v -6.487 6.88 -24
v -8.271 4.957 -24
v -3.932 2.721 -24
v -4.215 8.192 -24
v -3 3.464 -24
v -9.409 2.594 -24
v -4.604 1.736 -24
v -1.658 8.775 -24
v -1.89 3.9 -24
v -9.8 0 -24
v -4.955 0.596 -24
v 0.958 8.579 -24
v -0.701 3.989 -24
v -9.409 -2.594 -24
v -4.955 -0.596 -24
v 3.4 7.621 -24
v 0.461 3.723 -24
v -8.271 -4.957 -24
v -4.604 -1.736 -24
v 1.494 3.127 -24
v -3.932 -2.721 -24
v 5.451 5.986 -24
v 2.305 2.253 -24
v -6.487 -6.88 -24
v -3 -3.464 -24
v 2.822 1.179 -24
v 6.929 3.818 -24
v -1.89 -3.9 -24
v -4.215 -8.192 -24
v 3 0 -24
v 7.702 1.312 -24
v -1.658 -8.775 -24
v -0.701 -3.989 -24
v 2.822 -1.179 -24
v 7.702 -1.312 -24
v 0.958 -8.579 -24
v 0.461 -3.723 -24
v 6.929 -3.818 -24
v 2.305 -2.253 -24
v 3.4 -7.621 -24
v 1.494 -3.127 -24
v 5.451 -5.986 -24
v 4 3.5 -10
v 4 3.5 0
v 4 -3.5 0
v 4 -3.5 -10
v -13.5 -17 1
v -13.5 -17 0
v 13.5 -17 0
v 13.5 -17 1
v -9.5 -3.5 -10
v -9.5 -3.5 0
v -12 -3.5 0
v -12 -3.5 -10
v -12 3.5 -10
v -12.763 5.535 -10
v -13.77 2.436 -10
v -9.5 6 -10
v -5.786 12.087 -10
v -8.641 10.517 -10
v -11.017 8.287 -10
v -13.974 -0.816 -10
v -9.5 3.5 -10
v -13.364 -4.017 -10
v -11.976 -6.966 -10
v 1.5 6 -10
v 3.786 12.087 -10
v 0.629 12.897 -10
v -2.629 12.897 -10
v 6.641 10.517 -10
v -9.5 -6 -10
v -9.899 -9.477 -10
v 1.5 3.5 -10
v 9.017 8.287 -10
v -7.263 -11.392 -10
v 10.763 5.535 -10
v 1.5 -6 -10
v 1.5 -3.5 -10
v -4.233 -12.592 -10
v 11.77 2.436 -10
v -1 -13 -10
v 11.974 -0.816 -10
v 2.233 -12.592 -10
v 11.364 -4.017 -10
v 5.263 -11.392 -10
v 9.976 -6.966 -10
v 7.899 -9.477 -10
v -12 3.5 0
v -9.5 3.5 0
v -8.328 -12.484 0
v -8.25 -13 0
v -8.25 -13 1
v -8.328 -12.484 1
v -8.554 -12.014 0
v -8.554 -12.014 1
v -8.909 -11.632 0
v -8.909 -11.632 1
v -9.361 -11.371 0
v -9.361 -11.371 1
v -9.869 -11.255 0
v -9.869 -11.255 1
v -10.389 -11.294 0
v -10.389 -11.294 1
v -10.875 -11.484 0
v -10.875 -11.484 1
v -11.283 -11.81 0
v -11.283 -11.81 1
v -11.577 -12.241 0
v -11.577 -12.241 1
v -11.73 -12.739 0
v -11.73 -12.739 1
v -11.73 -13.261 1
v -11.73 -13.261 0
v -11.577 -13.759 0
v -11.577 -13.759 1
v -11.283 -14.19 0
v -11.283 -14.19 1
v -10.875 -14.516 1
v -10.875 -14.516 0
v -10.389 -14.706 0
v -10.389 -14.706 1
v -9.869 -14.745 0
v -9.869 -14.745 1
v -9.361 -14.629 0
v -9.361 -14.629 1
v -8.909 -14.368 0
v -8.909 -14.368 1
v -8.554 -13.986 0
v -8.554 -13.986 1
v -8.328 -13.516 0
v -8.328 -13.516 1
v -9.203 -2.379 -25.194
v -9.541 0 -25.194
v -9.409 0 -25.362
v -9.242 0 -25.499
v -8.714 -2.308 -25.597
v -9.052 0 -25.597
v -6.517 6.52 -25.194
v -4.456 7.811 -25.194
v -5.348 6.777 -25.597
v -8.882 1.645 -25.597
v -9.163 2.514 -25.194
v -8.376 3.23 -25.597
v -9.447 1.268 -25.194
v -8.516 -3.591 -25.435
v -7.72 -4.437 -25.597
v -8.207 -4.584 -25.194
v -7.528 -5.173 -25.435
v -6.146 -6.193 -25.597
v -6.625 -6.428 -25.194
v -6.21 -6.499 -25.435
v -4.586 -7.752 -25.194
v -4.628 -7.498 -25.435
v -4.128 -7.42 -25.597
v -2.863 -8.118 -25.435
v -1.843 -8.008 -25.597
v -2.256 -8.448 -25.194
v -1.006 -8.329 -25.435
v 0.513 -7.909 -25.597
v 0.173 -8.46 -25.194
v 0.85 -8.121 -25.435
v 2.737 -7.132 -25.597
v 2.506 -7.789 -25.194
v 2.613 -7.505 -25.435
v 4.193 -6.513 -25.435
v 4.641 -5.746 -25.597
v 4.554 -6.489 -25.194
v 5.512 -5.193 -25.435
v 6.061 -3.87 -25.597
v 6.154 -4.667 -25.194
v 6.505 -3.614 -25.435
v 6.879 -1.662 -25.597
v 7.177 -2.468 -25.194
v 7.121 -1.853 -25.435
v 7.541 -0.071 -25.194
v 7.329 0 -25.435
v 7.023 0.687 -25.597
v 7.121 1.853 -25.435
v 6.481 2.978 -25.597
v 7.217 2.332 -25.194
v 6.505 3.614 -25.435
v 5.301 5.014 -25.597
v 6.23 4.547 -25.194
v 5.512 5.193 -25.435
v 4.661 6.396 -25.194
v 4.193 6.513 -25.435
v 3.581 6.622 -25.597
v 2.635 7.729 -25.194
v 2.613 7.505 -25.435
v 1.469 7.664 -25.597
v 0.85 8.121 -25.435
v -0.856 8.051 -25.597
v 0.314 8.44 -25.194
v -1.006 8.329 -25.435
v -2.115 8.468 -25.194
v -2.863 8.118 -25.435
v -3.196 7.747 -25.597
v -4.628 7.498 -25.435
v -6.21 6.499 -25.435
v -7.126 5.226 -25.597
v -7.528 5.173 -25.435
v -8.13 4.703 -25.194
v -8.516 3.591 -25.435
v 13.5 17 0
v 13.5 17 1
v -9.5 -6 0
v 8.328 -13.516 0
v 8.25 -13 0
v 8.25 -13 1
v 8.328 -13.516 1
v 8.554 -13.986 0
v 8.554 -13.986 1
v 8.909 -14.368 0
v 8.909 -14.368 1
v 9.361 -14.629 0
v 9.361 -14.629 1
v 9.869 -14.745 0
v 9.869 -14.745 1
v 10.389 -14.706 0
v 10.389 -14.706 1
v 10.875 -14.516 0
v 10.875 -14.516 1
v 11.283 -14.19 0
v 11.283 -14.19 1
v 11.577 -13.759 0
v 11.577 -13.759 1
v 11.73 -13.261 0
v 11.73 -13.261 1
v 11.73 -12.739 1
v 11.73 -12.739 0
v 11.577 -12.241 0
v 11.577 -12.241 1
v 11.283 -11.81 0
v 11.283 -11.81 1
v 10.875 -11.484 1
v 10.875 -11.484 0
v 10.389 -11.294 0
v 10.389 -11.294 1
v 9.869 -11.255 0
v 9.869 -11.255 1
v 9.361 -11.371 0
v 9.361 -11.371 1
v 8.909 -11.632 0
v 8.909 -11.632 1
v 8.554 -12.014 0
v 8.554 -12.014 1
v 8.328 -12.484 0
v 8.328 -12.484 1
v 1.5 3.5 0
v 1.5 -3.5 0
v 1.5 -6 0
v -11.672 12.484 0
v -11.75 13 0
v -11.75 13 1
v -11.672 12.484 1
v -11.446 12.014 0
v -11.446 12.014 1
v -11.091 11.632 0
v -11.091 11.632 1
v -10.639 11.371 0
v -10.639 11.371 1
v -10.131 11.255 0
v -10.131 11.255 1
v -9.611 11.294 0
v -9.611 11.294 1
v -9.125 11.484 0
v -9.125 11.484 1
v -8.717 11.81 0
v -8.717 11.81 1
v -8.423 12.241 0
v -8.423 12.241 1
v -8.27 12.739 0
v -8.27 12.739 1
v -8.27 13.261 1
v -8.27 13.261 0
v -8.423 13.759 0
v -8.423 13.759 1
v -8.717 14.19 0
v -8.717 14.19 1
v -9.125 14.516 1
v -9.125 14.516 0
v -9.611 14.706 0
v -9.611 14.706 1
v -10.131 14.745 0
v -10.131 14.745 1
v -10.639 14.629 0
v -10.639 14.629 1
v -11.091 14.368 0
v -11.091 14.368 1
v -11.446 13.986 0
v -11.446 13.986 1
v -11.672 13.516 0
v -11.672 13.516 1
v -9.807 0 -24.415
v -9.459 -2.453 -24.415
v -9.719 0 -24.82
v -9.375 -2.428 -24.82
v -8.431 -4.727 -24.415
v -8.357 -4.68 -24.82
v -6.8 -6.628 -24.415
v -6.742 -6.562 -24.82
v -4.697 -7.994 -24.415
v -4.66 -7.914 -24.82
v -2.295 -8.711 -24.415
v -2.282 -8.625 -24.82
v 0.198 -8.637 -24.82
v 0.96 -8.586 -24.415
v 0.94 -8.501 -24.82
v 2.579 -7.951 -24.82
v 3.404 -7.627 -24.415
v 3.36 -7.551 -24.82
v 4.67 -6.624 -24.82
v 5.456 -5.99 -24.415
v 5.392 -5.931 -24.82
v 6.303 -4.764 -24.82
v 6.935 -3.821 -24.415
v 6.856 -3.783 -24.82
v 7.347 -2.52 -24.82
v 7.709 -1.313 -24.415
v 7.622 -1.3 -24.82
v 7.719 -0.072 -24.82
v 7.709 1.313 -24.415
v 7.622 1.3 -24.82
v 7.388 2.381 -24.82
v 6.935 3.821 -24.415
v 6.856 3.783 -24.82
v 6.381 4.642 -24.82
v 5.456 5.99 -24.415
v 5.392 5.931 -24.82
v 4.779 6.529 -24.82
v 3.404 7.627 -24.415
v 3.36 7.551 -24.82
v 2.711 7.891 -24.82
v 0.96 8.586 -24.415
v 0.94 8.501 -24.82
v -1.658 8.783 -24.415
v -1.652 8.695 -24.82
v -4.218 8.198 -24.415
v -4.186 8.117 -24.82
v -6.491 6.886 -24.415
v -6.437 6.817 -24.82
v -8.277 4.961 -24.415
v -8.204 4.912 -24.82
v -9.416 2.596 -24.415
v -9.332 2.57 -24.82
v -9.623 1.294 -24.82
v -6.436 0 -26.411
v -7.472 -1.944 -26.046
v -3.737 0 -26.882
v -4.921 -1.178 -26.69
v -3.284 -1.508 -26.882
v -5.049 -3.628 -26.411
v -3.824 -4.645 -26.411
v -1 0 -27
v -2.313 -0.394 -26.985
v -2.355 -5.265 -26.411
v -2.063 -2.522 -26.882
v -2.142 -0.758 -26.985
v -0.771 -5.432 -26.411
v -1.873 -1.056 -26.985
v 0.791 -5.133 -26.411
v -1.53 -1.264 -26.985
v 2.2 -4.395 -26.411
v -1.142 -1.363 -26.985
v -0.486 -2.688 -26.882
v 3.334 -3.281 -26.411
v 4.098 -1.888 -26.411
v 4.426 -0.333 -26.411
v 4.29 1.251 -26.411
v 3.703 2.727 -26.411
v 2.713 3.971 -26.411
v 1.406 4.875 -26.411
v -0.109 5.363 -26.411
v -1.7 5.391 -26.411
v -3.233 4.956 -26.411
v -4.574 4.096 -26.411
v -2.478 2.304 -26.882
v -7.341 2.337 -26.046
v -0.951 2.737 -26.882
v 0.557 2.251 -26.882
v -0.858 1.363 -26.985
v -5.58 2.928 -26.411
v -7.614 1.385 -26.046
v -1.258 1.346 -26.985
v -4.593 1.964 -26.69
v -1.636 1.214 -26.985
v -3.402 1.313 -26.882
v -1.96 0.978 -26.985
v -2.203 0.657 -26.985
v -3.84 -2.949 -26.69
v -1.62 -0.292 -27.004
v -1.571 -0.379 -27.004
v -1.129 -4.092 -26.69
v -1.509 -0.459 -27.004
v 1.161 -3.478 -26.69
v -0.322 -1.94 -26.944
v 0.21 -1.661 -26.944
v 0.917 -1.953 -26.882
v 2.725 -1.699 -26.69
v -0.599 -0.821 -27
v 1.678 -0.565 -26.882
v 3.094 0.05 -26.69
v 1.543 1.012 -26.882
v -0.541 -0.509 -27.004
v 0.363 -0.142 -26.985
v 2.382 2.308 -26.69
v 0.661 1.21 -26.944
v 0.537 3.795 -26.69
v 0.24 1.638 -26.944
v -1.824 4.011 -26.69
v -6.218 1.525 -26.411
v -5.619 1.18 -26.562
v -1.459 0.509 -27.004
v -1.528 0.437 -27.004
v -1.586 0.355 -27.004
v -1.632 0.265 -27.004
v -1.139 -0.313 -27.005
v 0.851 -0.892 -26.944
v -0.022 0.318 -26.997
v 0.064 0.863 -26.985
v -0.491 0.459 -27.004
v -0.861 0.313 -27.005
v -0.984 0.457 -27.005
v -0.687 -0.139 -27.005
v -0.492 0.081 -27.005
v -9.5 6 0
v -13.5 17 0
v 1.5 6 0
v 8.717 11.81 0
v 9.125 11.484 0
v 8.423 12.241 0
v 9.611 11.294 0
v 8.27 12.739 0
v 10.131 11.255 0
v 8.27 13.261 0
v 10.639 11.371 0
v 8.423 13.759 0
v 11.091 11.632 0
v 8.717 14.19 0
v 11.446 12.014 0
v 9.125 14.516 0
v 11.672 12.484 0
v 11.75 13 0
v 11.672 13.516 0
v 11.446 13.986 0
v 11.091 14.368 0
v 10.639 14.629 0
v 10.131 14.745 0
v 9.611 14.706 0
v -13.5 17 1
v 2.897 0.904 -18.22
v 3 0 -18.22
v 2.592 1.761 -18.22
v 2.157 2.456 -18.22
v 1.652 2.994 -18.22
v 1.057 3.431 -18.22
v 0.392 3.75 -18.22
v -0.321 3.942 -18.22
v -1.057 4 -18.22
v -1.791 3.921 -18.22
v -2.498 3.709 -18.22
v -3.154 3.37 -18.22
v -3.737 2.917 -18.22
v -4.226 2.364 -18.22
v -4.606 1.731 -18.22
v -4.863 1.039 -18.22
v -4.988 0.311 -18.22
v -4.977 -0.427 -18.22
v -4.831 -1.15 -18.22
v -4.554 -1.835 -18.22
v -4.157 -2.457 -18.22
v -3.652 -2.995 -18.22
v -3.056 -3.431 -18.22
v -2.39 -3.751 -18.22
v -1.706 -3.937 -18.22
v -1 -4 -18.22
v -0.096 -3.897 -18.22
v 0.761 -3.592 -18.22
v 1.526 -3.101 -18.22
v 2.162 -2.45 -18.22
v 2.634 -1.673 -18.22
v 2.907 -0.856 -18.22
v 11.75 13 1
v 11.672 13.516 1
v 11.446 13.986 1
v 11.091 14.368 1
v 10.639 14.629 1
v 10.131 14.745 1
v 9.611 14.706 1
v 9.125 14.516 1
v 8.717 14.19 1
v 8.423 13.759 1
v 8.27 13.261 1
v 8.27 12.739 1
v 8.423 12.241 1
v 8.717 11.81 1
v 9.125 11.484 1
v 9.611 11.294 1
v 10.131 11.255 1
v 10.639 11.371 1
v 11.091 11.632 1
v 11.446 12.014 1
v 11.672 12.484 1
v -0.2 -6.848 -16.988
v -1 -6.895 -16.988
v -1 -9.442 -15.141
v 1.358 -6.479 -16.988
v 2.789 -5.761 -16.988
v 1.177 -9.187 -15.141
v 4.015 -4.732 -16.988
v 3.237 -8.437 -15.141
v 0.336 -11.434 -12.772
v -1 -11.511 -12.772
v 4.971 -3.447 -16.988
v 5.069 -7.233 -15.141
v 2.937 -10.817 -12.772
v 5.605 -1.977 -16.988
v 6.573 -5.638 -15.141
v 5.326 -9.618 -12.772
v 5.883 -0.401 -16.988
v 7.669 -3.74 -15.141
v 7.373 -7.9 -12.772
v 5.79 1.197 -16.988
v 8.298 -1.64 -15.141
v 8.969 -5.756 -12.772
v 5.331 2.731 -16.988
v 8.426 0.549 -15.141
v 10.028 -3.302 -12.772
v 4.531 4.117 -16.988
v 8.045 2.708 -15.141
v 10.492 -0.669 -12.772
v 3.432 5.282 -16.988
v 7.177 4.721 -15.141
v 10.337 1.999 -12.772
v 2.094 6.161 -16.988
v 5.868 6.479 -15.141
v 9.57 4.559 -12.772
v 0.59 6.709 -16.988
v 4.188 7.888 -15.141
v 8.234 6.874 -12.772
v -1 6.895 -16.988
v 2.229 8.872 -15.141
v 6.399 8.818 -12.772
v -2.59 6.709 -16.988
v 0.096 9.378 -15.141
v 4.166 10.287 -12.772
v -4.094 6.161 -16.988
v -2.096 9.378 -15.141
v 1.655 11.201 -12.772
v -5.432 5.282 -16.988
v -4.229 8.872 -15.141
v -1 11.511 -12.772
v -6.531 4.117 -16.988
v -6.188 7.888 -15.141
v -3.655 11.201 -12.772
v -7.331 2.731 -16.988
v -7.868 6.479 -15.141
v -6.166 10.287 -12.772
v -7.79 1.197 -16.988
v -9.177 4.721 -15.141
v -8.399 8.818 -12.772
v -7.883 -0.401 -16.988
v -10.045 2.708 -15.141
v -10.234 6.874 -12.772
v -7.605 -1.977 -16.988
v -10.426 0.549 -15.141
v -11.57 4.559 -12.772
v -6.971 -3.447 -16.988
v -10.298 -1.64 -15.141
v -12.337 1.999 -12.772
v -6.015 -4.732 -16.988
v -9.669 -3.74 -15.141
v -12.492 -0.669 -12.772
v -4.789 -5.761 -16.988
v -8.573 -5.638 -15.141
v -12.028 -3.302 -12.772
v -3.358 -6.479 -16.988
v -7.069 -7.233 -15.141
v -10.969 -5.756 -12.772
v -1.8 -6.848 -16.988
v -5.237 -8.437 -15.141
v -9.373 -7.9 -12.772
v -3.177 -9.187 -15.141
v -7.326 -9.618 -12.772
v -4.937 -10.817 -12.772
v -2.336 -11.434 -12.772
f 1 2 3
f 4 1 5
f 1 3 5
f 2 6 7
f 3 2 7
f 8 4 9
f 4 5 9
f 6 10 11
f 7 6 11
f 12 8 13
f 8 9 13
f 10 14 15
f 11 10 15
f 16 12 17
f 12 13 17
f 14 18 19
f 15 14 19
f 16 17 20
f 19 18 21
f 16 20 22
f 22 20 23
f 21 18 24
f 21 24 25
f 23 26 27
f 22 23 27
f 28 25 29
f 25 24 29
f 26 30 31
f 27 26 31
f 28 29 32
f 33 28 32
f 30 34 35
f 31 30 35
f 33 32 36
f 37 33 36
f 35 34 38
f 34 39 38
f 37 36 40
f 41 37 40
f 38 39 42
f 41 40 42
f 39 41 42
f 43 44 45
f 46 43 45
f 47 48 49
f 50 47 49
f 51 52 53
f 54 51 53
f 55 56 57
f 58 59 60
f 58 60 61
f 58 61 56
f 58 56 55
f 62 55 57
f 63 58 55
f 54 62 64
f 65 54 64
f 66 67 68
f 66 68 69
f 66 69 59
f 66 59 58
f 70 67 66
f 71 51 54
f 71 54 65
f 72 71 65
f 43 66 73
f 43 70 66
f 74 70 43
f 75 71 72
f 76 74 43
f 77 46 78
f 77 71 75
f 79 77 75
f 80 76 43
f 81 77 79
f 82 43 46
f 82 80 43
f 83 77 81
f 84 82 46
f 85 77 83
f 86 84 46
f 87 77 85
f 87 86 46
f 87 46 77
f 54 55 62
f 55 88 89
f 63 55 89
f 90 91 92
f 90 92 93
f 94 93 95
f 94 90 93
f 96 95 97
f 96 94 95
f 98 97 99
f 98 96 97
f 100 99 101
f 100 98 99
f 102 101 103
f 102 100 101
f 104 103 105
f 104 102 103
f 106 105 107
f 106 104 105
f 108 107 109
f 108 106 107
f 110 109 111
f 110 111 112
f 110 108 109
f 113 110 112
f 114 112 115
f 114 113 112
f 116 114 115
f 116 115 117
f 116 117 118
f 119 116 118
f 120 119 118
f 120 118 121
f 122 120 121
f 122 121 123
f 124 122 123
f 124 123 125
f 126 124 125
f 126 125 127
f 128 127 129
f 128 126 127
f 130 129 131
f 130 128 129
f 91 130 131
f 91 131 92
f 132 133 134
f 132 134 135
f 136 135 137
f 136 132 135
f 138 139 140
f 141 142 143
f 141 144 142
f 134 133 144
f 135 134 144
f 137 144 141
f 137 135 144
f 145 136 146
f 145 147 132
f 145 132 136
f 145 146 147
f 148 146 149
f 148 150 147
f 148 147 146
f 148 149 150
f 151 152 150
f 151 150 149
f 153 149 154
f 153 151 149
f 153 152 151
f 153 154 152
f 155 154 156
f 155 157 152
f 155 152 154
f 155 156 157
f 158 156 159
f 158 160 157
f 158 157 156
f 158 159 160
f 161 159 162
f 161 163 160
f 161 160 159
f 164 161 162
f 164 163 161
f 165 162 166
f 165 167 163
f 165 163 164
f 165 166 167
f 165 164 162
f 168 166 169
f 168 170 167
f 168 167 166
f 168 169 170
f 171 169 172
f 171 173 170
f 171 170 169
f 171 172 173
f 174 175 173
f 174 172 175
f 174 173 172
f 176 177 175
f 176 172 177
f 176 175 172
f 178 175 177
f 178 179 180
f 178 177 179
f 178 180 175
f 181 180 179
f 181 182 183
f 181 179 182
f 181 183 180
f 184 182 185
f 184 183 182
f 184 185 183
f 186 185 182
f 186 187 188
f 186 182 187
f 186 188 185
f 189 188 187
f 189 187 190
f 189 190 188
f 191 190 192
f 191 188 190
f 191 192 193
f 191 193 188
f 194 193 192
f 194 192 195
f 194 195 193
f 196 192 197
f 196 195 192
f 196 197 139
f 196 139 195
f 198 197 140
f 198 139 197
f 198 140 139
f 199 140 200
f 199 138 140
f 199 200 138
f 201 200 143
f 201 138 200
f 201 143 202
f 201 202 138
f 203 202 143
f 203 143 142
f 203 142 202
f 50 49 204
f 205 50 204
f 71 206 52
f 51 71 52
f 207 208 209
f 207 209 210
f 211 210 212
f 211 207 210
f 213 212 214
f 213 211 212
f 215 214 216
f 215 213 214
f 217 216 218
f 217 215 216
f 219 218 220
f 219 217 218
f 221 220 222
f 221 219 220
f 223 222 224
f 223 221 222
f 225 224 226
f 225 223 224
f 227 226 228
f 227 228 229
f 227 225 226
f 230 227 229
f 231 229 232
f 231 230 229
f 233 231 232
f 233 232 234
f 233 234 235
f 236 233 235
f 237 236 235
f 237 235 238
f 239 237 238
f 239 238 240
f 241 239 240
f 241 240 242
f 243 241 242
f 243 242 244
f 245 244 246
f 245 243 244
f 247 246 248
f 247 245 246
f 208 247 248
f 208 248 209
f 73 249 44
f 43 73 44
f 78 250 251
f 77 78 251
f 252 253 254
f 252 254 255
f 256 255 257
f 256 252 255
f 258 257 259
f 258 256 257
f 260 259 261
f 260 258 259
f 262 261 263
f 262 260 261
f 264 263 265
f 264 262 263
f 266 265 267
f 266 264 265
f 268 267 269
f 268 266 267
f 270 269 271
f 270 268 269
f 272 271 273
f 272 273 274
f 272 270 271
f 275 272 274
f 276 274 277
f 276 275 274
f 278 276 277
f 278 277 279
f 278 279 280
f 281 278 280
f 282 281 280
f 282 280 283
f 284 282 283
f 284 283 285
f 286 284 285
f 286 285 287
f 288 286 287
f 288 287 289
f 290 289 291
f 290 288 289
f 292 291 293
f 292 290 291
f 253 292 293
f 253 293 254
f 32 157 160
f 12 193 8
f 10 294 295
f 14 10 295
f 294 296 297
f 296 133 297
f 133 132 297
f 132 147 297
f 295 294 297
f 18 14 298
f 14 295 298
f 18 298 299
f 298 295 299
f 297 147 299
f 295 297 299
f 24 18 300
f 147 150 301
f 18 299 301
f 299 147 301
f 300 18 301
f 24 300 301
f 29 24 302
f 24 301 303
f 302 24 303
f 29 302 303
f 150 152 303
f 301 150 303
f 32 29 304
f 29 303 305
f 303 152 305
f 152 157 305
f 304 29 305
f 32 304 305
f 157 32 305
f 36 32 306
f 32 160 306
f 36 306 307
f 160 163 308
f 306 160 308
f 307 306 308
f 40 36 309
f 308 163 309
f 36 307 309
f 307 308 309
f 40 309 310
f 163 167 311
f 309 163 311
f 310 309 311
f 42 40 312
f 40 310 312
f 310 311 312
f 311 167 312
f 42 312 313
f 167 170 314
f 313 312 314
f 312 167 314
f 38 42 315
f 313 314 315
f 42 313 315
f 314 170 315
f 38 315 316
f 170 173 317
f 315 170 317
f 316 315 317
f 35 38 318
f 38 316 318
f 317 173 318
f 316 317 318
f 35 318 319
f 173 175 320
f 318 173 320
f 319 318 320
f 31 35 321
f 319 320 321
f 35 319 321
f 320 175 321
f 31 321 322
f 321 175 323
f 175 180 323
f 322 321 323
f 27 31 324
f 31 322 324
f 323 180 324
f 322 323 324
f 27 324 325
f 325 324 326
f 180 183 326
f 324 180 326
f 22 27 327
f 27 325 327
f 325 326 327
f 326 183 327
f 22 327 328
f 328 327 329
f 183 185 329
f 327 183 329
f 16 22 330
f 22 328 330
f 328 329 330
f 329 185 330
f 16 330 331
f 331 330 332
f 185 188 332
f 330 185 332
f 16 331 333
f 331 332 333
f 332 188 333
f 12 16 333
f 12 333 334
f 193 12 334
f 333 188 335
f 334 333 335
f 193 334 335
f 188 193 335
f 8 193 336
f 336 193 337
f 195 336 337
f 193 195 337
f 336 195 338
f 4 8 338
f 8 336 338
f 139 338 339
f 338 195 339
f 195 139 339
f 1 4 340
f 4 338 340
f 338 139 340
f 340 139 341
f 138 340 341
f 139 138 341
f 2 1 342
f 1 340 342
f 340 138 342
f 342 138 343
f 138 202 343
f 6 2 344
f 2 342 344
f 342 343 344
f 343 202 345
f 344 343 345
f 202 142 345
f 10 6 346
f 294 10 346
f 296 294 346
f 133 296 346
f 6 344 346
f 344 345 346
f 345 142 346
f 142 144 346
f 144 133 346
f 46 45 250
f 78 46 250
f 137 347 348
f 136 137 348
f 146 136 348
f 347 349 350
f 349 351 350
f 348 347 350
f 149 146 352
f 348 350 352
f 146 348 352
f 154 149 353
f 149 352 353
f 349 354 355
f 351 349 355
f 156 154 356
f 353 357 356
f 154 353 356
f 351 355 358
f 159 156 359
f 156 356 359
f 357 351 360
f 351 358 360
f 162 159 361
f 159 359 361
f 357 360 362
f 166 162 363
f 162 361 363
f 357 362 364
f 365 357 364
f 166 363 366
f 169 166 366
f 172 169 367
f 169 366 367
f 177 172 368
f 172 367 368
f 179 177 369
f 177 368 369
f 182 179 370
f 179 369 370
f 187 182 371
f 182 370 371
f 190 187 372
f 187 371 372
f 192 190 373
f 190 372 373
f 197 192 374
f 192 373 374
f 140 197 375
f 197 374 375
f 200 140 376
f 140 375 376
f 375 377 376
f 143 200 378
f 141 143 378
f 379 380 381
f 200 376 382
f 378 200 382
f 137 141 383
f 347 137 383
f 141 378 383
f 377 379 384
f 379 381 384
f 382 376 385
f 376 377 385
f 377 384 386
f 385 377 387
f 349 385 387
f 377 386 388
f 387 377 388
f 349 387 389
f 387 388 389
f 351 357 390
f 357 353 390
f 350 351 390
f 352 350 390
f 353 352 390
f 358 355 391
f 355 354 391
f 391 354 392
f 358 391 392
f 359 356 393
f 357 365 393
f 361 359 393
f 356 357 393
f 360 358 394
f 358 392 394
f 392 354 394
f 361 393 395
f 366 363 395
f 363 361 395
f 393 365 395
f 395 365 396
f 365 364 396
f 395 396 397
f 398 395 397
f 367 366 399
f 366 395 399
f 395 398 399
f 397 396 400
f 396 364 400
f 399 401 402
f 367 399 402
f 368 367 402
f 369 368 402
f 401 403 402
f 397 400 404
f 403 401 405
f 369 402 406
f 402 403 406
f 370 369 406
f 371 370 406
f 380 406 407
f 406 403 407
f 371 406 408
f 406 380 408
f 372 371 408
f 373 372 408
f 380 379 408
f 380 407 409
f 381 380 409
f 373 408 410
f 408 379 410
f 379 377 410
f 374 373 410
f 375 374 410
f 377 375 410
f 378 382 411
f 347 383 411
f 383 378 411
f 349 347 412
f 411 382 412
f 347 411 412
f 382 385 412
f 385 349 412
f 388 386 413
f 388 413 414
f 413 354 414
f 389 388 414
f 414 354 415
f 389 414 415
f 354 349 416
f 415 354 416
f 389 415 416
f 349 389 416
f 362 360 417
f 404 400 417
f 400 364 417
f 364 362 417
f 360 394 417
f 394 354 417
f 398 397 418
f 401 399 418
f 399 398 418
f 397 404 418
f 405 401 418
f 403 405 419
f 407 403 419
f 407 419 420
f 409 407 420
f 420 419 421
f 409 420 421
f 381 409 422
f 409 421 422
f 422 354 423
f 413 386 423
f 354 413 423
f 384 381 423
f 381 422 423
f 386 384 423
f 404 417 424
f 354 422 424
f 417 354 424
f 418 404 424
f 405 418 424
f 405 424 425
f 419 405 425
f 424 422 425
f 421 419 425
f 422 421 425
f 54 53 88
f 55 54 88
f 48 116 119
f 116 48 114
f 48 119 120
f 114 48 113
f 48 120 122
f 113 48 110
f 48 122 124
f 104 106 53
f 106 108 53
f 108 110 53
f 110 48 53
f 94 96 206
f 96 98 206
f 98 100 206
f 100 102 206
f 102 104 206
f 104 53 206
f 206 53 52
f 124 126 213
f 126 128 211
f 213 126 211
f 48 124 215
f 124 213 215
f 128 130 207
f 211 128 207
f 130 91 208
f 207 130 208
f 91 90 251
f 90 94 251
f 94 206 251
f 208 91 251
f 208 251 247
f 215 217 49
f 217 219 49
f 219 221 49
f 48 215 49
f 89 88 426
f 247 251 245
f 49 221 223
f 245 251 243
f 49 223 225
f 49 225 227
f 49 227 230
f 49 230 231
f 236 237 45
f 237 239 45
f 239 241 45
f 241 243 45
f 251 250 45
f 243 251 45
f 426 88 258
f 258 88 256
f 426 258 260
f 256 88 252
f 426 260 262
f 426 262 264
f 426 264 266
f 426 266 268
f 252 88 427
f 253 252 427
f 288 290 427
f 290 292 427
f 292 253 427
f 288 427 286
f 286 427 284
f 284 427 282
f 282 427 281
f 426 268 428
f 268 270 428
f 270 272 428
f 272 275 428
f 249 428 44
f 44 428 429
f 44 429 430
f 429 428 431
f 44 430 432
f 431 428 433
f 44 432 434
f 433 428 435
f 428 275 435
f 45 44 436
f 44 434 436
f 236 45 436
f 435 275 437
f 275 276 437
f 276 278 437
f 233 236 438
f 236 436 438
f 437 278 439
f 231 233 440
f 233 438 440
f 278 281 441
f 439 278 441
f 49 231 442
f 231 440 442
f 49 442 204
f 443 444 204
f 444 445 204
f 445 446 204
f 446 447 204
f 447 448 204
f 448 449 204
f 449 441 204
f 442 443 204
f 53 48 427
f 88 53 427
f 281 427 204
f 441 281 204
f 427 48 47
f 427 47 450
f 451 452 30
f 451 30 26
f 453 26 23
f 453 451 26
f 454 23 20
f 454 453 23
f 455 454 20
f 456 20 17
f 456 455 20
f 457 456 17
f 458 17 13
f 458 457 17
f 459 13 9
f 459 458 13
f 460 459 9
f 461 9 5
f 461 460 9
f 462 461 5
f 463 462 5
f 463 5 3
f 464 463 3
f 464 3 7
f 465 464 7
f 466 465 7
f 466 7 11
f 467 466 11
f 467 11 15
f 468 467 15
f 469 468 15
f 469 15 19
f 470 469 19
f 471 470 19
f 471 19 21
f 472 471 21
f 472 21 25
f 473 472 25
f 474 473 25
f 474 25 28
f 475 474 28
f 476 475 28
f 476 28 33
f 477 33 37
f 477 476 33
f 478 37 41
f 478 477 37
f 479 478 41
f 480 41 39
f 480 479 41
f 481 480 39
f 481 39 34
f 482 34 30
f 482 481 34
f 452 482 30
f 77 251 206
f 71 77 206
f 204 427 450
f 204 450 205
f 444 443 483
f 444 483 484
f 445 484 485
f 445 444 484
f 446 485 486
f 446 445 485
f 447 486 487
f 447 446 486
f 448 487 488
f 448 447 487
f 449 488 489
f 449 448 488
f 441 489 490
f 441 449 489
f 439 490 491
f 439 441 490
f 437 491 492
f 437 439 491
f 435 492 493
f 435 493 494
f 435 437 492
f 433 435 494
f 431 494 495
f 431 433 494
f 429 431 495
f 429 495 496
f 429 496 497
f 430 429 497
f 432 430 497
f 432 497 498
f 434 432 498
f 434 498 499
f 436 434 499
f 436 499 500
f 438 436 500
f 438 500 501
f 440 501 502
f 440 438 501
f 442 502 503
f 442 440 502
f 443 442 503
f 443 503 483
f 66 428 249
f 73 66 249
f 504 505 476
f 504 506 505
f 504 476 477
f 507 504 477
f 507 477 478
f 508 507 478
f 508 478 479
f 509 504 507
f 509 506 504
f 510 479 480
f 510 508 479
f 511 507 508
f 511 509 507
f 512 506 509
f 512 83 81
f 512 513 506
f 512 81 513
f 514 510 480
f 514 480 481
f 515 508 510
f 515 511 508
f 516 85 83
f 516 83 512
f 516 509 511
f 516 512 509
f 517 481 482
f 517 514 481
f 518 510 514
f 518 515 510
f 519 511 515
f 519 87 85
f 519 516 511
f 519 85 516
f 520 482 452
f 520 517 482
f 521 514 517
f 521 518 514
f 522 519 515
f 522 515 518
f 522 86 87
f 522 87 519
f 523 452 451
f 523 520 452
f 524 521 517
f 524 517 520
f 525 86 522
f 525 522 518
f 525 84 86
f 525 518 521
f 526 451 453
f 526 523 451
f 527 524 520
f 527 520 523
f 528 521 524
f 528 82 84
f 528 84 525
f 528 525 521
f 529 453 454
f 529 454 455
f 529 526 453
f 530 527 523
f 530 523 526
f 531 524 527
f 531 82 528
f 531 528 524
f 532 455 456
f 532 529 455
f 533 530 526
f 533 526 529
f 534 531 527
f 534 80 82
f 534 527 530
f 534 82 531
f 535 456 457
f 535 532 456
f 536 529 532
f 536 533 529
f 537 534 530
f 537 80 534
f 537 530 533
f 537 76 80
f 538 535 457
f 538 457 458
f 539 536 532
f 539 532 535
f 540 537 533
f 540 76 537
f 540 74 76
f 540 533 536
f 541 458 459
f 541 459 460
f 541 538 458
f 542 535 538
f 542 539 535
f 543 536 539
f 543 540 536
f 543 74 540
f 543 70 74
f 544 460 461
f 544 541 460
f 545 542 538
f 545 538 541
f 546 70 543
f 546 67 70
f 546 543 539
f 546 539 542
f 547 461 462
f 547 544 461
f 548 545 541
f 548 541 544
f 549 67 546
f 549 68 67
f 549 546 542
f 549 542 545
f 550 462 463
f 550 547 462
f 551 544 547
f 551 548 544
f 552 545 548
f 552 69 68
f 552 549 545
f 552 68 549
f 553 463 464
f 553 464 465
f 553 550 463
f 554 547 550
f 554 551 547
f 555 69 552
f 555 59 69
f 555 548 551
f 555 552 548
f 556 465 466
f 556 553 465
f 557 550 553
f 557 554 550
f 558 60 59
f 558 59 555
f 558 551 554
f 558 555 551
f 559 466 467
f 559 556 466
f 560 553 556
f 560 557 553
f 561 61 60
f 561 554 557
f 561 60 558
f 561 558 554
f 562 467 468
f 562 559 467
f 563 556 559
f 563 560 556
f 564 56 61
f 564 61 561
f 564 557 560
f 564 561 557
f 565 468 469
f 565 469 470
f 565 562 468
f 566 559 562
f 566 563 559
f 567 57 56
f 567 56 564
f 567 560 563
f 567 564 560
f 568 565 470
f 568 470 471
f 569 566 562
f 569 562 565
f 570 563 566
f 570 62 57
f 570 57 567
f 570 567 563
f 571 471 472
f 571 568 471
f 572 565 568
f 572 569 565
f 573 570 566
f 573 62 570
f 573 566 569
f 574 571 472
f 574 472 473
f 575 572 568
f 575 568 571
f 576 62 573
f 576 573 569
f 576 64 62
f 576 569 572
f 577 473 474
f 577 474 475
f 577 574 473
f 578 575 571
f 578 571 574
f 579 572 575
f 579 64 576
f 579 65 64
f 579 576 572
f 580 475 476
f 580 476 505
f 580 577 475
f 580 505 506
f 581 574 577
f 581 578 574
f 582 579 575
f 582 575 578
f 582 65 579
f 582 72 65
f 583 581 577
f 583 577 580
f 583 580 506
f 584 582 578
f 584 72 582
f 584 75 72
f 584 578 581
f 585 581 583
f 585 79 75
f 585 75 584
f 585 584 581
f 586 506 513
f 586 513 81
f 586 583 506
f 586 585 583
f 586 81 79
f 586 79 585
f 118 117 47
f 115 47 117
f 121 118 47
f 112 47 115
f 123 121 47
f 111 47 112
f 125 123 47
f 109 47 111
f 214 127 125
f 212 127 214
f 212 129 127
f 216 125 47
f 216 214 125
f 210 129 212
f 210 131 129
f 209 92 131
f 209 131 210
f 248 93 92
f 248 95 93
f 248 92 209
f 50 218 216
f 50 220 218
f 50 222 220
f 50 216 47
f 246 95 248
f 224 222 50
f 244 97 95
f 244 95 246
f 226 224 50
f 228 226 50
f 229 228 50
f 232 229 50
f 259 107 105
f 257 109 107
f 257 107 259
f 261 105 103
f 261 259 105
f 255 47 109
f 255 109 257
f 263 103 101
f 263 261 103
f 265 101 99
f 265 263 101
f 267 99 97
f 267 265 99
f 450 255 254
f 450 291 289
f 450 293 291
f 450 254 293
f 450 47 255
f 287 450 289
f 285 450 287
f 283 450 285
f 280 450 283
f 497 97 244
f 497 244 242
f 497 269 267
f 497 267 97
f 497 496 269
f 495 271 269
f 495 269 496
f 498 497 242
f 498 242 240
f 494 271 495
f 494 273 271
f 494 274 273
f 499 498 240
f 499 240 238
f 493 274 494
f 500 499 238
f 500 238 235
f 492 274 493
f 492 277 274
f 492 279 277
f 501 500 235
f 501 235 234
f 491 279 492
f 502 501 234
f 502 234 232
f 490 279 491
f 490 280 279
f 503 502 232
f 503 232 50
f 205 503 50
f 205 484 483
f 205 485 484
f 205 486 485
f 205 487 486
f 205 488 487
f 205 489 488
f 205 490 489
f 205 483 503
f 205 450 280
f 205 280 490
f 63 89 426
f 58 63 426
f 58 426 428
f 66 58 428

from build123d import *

# Parameters (mm, degrees)
SKETCH_1_W      = 27
SKETCH_1_H      = 34
SKETCH_1_R      = 1.75
EXTRUDE_1_DEPTH = 1
EXTRUDE_2_DEPTH = 10
SKETCH_4_R      = 4
EXTRUDE_3_DEPTH = 6
FILLET_1_R      = 1


with BuildPart() as part:
    # 草图1 → 凸台-拉伸1 (new body)
    with BuildSketch(Plane.XY):
        Rectangle(SKETCH_1_W, SKETCH_1_H)
        with Locations((10, 13)):
            Circle(SKETCH_1_R, mode=Mode.SUBTRACT)
        with Locations(Location((-10, 13, 0), (0, 0, 180))):
            Circle(SKETCH_1_R, mode=Mode.SUBTRACT)
        with Locations(Location((10, -13, 0), (0, 0, 180))):
            Circle(SKETCH_1_R, mode=Mode.SUBTRACT)
        with Locations((-10, -13)):
            Circle(SKETCH_1_R, mode=Mode.SUBTRACT)
    extrude(amount=EXTRUDE_1_DEPTH)

    # 草图2 → 凸台-拉伸2 (add)
    with BuildSketch(Plane(origin=(0, 0, 0), x_dir=(-1, 0, 0), z_dir=(0, 0, -1))):
        Polygon((12, 0), (12, 3.5), (9.5, 3.5), (9.5, 6), (-1.5, 6), (-1.5, 3.5), (-4, 3.5), (-4, -3.5), (-1.5, -3.5), (-1.5, -6), (9.5, -6), (9.5, -3.5), (12, -3.5), align=None)
    extrude(amount=EXTRUDE_2_DEPTH)

    # 草图3 → 旋转1 (revolve)
    with BuildSketch(Plane(origin=(-1, 0, 0), x_dir=(0, 0, -1), z_dir=(1, 0, 0))):
        with BuildLine():
            Line((10, -13), (10, 0))
            Line((10, 0), (18.803847577, 0))
            ThreePointArc((18.803847577, 0), (16.395787318, -7.850282354), (10, -13))
        make_face()
    revolve(axis=Axis((-1, 0, -17.702001311), (0, 0, 1)))

    # 草图4 → 凸台-拉伸3 (add)
    with BuildSketch(Plane.XY.offset(-18)):
        with Locations((-1, 0)):
            Circle(SKETCH_4_R)
    extrude(amount=-EXTRUDE_3_DEPTH)

    # 草图5 → 旋转3 (revolve)
    with BuildSketch(Plane(origin=(-1, 0, 0), x_dir=(0, 0, -1), z_dir=(1, 0, 0)), mode=Mode.PRIVATE) as revolve_3_sk:
        with BuildLine():
            Line((24, 0), (24, -8.8))
            ThreePointArc((24, -8.8), (24.807839272, -8.723517815), (25.5, -8.3))
            ThreePointArc((25.5, -8.3), (26.666937336, -4.225350121), (27, 0))
            Line((27, 0), (24, 0))
        make_face()
    revolve(revolve_3_sk.sketch.rotate(Axis((-1, 0, -28.967381471), (0, 0, 1)), 270), axis=Axis((-1, 0, -28.967381471), (0, 0, 1)))

    # 圆角1
    fillet_1_edges = [part.edges().sort_by_distance(p)[0] for p in [
        (7.3, 0, -25.5),
    ]]
    fillet(fillet_1_edges, radius=FILLET_1_R)


solid = part.part
